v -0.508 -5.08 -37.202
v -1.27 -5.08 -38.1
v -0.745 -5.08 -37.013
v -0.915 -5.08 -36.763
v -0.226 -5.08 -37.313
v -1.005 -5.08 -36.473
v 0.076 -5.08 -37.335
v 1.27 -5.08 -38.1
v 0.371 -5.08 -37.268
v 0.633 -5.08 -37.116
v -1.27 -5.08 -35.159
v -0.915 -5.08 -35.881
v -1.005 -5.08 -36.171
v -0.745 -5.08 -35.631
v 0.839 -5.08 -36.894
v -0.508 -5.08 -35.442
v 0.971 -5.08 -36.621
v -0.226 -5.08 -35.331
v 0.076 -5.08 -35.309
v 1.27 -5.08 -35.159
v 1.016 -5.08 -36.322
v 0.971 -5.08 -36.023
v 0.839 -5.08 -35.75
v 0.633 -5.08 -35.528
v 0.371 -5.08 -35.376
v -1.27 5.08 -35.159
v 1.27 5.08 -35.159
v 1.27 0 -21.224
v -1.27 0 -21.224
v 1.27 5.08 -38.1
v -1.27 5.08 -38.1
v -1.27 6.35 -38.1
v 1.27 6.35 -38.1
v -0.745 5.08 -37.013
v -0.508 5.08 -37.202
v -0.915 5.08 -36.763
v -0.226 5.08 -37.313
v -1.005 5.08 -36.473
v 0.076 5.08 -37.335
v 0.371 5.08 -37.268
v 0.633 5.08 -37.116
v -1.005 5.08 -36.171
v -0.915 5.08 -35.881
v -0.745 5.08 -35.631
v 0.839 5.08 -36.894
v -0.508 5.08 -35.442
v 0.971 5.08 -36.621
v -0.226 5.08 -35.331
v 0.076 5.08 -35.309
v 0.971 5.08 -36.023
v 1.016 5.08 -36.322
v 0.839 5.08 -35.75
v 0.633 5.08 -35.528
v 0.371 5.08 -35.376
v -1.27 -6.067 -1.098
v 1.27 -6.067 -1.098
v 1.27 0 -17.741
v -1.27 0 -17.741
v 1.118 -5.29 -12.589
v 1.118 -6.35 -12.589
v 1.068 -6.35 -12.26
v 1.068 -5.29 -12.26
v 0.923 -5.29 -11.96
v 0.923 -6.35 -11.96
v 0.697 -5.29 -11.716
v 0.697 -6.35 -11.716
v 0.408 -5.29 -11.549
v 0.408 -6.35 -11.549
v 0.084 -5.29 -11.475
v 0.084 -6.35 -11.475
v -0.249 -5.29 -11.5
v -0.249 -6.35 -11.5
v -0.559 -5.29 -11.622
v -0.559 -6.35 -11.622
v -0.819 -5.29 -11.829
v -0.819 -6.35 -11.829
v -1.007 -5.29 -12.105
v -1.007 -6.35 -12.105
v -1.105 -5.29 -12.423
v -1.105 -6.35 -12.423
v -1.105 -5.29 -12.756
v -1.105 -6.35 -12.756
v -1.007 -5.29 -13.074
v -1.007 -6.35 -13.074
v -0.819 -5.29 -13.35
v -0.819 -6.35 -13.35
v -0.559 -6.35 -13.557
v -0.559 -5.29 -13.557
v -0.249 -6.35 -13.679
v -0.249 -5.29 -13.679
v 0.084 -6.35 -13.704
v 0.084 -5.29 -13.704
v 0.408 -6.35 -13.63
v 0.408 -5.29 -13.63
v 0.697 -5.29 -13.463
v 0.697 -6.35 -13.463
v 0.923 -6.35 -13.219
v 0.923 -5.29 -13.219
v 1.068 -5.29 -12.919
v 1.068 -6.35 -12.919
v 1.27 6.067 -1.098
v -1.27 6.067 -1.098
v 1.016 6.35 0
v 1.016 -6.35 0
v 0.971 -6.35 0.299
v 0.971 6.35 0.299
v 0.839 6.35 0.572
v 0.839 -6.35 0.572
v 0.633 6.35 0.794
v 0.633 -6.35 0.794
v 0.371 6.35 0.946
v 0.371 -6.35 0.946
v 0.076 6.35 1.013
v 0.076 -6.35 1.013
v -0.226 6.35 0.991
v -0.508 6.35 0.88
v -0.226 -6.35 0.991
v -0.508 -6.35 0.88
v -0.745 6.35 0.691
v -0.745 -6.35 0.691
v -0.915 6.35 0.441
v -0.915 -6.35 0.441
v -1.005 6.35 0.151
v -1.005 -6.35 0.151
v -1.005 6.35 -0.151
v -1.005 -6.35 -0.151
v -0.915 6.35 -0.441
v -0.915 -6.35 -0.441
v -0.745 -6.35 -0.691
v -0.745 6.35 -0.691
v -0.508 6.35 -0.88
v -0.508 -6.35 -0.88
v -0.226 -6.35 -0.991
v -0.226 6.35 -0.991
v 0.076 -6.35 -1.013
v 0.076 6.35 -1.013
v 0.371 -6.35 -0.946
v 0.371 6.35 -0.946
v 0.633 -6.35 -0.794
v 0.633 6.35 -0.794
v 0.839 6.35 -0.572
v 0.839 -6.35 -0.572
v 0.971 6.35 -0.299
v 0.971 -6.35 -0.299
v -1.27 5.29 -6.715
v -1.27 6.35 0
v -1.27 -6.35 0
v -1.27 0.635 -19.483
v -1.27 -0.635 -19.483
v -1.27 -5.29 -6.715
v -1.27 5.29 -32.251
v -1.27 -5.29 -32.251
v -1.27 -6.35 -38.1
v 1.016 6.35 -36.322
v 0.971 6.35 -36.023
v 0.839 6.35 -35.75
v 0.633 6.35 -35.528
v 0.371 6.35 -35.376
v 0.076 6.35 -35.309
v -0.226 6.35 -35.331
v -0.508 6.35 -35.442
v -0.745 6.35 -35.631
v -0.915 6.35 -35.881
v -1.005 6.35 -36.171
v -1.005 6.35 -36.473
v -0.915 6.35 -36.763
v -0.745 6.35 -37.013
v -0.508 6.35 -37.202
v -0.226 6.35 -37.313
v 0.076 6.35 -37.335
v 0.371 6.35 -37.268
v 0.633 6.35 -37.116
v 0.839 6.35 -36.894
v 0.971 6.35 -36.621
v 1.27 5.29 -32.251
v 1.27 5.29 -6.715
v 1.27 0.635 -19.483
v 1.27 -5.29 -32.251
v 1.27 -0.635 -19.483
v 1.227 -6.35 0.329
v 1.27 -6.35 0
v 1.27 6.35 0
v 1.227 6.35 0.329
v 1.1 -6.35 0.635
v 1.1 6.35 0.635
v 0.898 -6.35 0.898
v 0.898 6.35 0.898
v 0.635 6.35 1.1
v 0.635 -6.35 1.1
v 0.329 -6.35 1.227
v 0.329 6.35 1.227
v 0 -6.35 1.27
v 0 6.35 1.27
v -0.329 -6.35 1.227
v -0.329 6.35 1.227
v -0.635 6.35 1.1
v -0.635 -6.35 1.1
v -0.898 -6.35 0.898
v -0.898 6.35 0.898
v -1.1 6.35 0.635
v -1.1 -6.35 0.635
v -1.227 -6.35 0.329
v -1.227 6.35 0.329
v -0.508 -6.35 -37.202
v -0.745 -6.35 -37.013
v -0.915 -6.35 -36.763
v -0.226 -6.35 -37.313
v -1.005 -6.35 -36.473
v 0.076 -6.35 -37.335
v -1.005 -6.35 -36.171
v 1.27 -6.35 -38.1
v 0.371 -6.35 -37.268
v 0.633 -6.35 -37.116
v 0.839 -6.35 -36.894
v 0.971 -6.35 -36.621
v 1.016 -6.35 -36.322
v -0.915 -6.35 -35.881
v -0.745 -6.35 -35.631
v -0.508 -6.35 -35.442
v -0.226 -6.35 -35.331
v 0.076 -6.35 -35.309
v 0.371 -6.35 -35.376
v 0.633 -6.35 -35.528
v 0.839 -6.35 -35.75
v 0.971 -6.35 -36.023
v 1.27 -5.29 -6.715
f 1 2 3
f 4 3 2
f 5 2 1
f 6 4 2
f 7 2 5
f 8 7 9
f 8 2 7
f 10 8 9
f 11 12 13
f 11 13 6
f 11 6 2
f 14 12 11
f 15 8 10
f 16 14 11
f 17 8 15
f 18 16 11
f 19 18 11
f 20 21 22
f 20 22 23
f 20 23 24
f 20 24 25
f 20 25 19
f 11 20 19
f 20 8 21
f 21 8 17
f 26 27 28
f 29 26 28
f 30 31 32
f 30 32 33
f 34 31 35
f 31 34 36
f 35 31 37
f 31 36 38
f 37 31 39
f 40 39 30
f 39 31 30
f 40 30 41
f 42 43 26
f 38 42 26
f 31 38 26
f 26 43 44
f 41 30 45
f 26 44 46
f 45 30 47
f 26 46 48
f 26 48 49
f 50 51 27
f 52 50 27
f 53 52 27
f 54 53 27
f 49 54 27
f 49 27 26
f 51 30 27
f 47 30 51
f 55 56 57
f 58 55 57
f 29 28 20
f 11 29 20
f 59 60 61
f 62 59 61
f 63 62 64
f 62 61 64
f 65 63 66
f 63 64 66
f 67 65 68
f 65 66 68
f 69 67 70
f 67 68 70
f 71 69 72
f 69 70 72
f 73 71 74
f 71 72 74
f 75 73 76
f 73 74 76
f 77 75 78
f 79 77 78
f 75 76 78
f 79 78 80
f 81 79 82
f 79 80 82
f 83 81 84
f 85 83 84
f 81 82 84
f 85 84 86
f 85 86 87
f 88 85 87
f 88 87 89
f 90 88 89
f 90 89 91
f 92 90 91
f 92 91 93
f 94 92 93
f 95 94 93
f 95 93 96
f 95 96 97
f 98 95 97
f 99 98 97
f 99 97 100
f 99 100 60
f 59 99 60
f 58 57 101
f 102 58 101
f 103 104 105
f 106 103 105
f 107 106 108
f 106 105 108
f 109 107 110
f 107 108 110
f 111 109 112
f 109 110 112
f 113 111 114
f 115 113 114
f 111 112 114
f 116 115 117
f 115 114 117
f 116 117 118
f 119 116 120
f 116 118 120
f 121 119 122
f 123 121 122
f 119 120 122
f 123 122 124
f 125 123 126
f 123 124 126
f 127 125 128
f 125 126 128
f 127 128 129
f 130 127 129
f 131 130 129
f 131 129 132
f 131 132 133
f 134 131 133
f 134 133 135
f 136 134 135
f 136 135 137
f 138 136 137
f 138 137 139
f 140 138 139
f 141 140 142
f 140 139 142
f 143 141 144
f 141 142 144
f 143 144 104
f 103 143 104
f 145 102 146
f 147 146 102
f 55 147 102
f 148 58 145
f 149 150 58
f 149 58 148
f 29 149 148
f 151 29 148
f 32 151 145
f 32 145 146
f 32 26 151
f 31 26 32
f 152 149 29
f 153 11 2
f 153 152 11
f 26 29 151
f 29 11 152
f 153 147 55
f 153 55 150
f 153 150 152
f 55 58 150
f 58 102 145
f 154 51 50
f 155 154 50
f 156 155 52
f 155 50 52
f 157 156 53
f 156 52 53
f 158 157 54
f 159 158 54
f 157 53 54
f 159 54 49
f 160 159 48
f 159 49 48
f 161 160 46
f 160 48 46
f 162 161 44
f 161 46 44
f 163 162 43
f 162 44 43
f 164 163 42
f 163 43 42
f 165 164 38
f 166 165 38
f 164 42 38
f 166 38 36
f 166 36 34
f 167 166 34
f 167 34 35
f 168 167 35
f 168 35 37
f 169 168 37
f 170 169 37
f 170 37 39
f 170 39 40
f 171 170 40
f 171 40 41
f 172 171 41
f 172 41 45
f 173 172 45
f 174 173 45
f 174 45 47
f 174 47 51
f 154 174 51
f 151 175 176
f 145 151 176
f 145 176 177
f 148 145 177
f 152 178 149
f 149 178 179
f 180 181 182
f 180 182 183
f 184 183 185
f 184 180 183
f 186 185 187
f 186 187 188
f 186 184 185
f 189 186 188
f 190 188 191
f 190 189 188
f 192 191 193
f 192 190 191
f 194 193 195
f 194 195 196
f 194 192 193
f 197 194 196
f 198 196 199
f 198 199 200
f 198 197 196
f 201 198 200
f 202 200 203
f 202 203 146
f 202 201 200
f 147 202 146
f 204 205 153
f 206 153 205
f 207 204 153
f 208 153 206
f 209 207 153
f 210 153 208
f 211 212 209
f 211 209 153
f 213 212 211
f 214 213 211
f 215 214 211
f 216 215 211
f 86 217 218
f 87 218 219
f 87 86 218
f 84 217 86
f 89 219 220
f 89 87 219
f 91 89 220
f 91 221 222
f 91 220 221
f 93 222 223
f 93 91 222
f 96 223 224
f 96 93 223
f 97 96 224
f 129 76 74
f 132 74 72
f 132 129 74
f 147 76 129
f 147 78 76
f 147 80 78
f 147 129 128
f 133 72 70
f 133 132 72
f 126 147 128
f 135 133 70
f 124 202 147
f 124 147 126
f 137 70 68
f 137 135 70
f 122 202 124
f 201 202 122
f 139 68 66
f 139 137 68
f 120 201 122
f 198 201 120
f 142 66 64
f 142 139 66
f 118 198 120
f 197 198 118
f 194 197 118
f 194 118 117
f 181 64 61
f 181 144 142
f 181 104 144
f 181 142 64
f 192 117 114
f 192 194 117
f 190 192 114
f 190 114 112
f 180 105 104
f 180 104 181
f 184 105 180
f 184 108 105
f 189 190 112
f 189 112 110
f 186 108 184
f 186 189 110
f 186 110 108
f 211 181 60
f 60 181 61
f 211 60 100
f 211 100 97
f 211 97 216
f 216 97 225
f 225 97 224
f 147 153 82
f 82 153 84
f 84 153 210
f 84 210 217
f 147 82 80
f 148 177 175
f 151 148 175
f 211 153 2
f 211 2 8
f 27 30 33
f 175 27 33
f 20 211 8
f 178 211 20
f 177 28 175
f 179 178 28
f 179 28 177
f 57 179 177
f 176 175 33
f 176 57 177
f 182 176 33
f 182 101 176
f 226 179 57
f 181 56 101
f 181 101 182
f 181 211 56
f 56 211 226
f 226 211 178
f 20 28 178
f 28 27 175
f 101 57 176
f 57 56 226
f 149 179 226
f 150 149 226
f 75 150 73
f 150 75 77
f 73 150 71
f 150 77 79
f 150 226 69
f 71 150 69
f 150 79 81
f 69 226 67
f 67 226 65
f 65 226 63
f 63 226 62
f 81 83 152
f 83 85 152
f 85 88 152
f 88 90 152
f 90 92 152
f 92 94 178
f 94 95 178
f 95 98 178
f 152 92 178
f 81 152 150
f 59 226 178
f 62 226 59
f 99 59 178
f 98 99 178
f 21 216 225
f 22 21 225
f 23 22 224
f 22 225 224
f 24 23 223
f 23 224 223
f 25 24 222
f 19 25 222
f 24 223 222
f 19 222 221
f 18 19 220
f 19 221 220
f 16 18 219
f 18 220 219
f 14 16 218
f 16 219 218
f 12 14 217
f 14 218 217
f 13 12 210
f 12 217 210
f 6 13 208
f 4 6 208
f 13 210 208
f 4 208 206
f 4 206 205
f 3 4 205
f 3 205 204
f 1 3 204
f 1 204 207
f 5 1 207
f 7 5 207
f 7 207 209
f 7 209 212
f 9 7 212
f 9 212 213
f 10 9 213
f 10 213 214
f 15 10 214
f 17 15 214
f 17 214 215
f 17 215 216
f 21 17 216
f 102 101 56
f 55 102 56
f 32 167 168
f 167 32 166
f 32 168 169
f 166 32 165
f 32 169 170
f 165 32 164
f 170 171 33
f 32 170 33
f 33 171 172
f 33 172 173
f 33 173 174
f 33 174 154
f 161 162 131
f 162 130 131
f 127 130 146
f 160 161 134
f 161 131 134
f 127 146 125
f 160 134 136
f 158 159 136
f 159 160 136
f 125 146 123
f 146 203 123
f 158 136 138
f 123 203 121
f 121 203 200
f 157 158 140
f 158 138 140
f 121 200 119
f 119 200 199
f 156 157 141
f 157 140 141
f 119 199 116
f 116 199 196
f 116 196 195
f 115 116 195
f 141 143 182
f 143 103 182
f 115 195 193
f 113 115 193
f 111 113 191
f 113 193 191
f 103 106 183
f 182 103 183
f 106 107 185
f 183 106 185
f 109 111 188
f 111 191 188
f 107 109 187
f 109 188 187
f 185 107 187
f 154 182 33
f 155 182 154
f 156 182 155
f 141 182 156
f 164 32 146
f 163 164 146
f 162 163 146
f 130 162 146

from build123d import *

# Parameters (mm, degrees)
F1_DEPTH = 6.35
F3_DEPTH = 2.54
F4_W     = 10.16
F4_H     = 2.9410431877
F5_DEPTH = 2.54
F6_R     = 1.016
F7_DEPTH = 12.7
F8_R     = 1.1176
F9_DEPTH = 2.54


# Not quite as in the source:
# - a feature names something its author has since deleted; it is built from what else it names


with BuildPart() as f1:
    # F0 (on Front) → F1 (new body, symmetric)
    with BuildSketch(Plane.XZ):
        with BuildLine():
            Line((1.27, -38.1), (1.27, 0))
            ThreePointArc((1.27, 0), (0.8980256121, 0.8980256121), (0, 1.27))
            ThreePointArc((0, 1.27), (-0.8980256121, 0.8980256121), (-1.27, 0))
            Line((-1.27, 0), (-1.27, -38.1))
            Line((-1.27, -38.1), (1.27, -38.1))
        make_face()
    extrude(amount=F1_DEPTH, both=True)

    # F2 (on face) → F3 (cut)
    with BuildSketch(Plane.YZ.offset(1.27)):
        Polygon((0.635, -19.4826158311), (5.2897260698, -32.2506076148), (5.2897260698, -6.7146240474), align=None)
        Polygon((0, -35.1589568123), (5.08, -35.1589568123), (0, -21.2244314957), align=None)
        Polygon((0, -1.0980047432), (0, -17.7408001665), (6.067332674, -1.0980047432), align=None)
        Polygon((-6.067332674, -1.0980047432), (0, -17.7408001665), (0, -1.0980047432), align=None)
        Polygon((0, -35.1589568123), (0, -21.2244314957), (-5.08, -35.1589568123), align=None)
        Polygon((-5.2897260698, -32.2506076148), (-0.635, -19.4826158311), (-5.2897260698, -6.7146240474), align=None)
    extrude(amount=-F3_DEPTH, mode=Mode.SUBTRACT)

    # F4 (on face) → F5 (cut)
    with BuildSketch(Plane.YZ.offset(1.27)):
        with Locations((0, -36.6294784061)):
            Rectangle(F4_W, F4_H)
    extrude(amount=-F5_DEPTH, mode=Mode.SUBTRACT)

    # F6 (on face) → F7 (cut)
    with BuildSketch(Plane.XZ.offset(6.35)):
        with Locations((0, -36.322)):
            Circle(F6_R)
        Circle(F6_R)
    extrude(amount=-F7_DEPTH, mode=Mode.SUBTRACT)

    # F8 (on face) → F9 (cut)
    with BuildSketch(Plane.XZ.offset(6.35)):
        with Locations((0, -12.589443475)):
            Circle(F8_R)
    extrude(amount=-F9_DEPTH, mode=Mode.SUBTRACT)


solid = f1.part
